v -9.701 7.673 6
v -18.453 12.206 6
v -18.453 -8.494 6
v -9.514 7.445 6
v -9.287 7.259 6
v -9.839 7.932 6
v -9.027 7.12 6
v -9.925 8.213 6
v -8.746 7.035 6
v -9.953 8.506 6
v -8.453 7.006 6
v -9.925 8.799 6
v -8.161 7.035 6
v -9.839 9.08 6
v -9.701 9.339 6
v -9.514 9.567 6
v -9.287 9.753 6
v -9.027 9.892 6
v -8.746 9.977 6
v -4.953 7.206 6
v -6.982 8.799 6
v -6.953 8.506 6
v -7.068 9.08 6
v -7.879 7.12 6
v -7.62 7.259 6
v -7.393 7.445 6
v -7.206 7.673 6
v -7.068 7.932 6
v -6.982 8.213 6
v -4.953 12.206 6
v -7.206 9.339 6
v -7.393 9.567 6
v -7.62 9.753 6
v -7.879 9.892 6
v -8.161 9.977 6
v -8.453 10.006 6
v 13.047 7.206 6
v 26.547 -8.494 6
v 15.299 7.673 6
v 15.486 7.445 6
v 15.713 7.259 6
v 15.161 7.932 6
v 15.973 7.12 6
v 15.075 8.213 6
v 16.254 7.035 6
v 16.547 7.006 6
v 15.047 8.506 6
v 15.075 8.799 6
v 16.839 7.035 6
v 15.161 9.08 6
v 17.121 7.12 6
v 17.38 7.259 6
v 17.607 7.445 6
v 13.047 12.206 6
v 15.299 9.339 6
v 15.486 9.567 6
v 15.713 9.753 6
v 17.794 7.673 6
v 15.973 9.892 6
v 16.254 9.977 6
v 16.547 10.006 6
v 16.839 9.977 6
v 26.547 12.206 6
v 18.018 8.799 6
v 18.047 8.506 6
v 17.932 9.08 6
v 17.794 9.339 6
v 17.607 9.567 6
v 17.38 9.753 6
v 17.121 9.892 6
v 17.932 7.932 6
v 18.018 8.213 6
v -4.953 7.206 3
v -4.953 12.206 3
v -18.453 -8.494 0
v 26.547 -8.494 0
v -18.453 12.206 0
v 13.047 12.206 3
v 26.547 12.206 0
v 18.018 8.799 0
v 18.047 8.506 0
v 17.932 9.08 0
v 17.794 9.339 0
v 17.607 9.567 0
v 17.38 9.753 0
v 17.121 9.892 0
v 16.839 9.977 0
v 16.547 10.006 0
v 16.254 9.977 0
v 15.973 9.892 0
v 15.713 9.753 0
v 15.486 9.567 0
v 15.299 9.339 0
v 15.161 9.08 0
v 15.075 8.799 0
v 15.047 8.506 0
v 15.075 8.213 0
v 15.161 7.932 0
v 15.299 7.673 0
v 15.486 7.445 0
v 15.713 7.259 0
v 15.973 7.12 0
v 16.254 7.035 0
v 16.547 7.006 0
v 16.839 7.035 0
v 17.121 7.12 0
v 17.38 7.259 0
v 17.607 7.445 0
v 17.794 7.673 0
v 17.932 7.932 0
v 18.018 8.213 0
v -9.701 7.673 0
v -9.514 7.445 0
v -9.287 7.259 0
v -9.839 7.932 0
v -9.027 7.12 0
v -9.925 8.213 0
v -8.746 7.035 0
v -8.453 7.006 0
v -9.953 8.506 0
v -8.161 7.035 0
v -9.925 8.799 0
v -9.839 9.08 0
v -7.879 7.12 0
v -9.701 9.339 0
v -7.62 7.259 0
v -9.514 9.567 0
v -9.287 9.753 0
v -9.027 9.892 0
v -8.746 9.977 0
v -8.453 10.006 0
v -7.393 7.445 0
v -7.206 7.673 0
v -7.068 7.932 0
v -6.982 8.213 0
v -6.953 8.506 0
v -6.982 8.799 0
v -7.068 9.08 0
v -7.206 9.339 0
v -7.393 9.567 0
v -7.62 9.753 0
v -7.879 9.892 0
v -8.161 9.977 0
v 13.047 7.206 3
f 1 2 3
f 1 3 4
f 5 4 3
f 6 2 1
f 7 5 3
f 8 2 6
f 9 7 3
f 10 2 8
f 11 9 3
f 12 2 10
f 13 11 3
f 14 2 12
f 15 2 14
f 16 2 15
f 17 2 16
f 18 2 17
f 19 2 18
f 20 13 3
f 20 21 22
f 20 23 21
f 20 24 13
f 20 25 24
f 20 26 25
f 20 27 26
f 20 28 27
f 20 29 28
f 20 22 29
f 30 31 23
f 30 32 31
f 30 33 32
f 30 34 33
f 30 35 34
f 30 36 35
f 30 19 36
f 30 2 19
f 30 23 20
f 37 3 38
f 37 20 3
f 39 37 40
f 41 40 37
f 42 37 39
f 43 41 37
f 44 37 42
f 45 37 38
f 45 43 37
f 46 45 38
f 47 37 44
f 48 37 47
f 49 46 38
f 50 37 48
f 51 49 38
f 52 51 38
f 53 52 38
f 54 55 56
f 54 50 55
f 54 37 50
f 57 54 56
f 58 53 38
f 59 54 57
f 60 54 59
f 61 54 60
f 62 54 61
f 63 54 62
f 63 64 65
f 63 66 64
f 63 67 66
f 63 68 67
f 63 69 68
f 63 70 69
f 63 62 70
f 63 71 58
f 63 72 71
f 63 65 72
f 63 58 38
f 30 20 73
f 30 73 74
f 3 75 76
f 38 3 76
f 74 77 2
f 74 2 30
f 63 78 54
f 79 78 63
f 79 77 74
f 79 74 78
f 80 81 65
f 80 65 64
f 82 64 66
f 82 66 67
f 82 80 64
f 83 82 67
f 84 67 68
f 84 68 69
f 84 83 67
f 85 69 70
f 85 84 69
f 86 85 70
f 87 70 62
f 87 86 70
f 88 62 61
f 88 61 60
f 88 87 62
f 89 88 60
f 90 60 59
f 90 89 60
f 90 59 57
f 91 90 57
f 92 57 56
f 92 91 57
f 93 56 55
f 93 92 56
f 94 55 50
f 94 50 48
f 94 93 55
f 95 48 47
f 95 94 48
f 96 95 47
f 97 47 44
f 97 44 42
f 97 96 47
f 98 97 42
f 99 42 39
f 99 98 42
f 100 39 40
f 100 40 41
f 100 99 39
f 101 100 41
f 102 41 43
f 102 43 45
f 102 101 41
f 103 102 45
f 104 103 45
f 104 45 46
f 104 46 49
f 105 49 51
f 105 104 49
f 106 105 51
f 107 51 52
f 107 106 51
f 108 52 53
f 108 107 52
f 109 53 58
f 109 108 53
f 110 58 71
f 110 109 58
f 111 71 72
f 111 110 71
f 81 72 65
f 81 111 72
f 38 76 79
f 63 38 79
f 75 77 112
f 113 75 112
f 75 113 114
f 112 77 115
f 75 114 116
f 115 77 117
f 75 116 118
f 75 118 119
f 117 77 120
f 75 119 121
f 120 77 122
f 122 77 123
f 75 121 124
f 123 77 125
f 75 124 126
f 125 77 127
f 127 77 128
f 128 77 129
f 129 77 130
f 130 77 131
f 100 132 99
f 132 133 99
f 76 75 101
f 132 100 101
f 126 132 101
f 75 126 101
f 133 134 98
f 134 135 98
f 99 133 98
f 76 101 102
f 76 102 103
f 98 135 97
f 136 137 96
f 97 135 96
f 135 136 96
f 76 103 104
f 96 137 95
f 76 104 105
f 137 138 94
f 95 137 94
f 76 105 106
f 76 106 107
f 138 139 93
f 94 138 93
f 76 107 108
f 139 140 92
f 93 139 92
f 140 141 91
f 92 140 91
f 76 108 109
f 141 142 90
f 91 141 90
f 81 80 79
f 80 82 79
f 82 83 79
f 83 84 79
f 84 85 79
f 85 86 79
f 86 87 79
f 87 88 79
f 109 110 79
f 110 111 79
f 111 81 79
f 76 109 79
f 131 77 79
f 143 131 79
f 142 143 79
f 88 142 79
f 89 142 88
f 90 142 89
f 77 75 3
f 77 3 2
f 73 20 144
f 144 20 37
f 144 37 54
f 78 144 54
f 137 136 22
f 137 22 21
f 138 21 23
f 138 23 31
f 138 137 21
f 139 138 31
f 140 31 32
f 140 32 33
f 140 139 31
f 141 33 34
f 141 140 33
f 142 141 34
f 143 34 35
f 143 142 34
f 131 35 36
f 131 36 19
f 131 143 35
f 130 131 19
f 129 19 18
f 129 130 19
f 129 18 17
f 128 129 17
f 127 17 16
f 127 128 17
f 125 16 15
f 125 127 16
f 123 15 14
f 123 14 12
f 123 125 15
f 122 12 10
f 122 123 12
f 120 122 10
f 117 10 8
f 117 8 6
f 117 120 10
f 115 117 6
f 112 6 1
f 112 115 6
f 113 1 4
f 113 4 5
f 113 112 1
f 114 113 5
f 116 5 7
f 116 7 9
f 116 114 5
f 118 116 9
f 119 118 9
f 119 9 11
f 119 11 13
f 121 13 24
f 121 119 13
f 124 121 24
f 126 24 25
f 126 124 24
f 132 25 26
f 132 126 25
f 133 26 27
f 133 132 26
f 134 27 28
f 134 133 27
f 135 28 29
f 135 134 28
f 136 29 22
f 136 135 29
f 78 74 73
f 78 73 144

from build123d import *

# Parameters (mm, degrees)
SKETCH1_W           = 45
SKETCH1_H           = 20.7
SKETCH1_R           = 1.5
BOSS_EXTRUDE1_DEPTH = 6
SKETCH3_W           = 18
SKETCH3_H           = 5
CUT_EXTRUDE1_DEPTH  = 3


with BuildPart() as part:
    # Sketch1 → Boss-Extrude1 (new body)
    with BuildSketch(Plane.XY):
        with Locations((4.046614158, 1.856007179)):
            Rectangle(SKETCH1_W, SKETCH1_H)
        with Locations((16.546614158, 8.506007179)):
            Circle(SKETCH1_R, mode=Mode.SUBTRACT)
        with Locations((-8.453385842, 8.506007179)):
            Circle(SKETCH1_R, mode=Mode.SUBTRACT)
    extrude(amount=BOSS_EXTRUDE1_DEPTH)

    # Sketch3 → Cut-Extrude1 (cut)
    with BuildSketch(Plane.XY.offset(6)):
        with Locations((4.046614158, 9.706007179)):
            Rectangle(SKETCH3_W, SKETCH3_H)
    extrude(amount=-CUT_EXTRUDE1_DEPTH, mode=Mode.SUBTRACT)


solid = part.part
